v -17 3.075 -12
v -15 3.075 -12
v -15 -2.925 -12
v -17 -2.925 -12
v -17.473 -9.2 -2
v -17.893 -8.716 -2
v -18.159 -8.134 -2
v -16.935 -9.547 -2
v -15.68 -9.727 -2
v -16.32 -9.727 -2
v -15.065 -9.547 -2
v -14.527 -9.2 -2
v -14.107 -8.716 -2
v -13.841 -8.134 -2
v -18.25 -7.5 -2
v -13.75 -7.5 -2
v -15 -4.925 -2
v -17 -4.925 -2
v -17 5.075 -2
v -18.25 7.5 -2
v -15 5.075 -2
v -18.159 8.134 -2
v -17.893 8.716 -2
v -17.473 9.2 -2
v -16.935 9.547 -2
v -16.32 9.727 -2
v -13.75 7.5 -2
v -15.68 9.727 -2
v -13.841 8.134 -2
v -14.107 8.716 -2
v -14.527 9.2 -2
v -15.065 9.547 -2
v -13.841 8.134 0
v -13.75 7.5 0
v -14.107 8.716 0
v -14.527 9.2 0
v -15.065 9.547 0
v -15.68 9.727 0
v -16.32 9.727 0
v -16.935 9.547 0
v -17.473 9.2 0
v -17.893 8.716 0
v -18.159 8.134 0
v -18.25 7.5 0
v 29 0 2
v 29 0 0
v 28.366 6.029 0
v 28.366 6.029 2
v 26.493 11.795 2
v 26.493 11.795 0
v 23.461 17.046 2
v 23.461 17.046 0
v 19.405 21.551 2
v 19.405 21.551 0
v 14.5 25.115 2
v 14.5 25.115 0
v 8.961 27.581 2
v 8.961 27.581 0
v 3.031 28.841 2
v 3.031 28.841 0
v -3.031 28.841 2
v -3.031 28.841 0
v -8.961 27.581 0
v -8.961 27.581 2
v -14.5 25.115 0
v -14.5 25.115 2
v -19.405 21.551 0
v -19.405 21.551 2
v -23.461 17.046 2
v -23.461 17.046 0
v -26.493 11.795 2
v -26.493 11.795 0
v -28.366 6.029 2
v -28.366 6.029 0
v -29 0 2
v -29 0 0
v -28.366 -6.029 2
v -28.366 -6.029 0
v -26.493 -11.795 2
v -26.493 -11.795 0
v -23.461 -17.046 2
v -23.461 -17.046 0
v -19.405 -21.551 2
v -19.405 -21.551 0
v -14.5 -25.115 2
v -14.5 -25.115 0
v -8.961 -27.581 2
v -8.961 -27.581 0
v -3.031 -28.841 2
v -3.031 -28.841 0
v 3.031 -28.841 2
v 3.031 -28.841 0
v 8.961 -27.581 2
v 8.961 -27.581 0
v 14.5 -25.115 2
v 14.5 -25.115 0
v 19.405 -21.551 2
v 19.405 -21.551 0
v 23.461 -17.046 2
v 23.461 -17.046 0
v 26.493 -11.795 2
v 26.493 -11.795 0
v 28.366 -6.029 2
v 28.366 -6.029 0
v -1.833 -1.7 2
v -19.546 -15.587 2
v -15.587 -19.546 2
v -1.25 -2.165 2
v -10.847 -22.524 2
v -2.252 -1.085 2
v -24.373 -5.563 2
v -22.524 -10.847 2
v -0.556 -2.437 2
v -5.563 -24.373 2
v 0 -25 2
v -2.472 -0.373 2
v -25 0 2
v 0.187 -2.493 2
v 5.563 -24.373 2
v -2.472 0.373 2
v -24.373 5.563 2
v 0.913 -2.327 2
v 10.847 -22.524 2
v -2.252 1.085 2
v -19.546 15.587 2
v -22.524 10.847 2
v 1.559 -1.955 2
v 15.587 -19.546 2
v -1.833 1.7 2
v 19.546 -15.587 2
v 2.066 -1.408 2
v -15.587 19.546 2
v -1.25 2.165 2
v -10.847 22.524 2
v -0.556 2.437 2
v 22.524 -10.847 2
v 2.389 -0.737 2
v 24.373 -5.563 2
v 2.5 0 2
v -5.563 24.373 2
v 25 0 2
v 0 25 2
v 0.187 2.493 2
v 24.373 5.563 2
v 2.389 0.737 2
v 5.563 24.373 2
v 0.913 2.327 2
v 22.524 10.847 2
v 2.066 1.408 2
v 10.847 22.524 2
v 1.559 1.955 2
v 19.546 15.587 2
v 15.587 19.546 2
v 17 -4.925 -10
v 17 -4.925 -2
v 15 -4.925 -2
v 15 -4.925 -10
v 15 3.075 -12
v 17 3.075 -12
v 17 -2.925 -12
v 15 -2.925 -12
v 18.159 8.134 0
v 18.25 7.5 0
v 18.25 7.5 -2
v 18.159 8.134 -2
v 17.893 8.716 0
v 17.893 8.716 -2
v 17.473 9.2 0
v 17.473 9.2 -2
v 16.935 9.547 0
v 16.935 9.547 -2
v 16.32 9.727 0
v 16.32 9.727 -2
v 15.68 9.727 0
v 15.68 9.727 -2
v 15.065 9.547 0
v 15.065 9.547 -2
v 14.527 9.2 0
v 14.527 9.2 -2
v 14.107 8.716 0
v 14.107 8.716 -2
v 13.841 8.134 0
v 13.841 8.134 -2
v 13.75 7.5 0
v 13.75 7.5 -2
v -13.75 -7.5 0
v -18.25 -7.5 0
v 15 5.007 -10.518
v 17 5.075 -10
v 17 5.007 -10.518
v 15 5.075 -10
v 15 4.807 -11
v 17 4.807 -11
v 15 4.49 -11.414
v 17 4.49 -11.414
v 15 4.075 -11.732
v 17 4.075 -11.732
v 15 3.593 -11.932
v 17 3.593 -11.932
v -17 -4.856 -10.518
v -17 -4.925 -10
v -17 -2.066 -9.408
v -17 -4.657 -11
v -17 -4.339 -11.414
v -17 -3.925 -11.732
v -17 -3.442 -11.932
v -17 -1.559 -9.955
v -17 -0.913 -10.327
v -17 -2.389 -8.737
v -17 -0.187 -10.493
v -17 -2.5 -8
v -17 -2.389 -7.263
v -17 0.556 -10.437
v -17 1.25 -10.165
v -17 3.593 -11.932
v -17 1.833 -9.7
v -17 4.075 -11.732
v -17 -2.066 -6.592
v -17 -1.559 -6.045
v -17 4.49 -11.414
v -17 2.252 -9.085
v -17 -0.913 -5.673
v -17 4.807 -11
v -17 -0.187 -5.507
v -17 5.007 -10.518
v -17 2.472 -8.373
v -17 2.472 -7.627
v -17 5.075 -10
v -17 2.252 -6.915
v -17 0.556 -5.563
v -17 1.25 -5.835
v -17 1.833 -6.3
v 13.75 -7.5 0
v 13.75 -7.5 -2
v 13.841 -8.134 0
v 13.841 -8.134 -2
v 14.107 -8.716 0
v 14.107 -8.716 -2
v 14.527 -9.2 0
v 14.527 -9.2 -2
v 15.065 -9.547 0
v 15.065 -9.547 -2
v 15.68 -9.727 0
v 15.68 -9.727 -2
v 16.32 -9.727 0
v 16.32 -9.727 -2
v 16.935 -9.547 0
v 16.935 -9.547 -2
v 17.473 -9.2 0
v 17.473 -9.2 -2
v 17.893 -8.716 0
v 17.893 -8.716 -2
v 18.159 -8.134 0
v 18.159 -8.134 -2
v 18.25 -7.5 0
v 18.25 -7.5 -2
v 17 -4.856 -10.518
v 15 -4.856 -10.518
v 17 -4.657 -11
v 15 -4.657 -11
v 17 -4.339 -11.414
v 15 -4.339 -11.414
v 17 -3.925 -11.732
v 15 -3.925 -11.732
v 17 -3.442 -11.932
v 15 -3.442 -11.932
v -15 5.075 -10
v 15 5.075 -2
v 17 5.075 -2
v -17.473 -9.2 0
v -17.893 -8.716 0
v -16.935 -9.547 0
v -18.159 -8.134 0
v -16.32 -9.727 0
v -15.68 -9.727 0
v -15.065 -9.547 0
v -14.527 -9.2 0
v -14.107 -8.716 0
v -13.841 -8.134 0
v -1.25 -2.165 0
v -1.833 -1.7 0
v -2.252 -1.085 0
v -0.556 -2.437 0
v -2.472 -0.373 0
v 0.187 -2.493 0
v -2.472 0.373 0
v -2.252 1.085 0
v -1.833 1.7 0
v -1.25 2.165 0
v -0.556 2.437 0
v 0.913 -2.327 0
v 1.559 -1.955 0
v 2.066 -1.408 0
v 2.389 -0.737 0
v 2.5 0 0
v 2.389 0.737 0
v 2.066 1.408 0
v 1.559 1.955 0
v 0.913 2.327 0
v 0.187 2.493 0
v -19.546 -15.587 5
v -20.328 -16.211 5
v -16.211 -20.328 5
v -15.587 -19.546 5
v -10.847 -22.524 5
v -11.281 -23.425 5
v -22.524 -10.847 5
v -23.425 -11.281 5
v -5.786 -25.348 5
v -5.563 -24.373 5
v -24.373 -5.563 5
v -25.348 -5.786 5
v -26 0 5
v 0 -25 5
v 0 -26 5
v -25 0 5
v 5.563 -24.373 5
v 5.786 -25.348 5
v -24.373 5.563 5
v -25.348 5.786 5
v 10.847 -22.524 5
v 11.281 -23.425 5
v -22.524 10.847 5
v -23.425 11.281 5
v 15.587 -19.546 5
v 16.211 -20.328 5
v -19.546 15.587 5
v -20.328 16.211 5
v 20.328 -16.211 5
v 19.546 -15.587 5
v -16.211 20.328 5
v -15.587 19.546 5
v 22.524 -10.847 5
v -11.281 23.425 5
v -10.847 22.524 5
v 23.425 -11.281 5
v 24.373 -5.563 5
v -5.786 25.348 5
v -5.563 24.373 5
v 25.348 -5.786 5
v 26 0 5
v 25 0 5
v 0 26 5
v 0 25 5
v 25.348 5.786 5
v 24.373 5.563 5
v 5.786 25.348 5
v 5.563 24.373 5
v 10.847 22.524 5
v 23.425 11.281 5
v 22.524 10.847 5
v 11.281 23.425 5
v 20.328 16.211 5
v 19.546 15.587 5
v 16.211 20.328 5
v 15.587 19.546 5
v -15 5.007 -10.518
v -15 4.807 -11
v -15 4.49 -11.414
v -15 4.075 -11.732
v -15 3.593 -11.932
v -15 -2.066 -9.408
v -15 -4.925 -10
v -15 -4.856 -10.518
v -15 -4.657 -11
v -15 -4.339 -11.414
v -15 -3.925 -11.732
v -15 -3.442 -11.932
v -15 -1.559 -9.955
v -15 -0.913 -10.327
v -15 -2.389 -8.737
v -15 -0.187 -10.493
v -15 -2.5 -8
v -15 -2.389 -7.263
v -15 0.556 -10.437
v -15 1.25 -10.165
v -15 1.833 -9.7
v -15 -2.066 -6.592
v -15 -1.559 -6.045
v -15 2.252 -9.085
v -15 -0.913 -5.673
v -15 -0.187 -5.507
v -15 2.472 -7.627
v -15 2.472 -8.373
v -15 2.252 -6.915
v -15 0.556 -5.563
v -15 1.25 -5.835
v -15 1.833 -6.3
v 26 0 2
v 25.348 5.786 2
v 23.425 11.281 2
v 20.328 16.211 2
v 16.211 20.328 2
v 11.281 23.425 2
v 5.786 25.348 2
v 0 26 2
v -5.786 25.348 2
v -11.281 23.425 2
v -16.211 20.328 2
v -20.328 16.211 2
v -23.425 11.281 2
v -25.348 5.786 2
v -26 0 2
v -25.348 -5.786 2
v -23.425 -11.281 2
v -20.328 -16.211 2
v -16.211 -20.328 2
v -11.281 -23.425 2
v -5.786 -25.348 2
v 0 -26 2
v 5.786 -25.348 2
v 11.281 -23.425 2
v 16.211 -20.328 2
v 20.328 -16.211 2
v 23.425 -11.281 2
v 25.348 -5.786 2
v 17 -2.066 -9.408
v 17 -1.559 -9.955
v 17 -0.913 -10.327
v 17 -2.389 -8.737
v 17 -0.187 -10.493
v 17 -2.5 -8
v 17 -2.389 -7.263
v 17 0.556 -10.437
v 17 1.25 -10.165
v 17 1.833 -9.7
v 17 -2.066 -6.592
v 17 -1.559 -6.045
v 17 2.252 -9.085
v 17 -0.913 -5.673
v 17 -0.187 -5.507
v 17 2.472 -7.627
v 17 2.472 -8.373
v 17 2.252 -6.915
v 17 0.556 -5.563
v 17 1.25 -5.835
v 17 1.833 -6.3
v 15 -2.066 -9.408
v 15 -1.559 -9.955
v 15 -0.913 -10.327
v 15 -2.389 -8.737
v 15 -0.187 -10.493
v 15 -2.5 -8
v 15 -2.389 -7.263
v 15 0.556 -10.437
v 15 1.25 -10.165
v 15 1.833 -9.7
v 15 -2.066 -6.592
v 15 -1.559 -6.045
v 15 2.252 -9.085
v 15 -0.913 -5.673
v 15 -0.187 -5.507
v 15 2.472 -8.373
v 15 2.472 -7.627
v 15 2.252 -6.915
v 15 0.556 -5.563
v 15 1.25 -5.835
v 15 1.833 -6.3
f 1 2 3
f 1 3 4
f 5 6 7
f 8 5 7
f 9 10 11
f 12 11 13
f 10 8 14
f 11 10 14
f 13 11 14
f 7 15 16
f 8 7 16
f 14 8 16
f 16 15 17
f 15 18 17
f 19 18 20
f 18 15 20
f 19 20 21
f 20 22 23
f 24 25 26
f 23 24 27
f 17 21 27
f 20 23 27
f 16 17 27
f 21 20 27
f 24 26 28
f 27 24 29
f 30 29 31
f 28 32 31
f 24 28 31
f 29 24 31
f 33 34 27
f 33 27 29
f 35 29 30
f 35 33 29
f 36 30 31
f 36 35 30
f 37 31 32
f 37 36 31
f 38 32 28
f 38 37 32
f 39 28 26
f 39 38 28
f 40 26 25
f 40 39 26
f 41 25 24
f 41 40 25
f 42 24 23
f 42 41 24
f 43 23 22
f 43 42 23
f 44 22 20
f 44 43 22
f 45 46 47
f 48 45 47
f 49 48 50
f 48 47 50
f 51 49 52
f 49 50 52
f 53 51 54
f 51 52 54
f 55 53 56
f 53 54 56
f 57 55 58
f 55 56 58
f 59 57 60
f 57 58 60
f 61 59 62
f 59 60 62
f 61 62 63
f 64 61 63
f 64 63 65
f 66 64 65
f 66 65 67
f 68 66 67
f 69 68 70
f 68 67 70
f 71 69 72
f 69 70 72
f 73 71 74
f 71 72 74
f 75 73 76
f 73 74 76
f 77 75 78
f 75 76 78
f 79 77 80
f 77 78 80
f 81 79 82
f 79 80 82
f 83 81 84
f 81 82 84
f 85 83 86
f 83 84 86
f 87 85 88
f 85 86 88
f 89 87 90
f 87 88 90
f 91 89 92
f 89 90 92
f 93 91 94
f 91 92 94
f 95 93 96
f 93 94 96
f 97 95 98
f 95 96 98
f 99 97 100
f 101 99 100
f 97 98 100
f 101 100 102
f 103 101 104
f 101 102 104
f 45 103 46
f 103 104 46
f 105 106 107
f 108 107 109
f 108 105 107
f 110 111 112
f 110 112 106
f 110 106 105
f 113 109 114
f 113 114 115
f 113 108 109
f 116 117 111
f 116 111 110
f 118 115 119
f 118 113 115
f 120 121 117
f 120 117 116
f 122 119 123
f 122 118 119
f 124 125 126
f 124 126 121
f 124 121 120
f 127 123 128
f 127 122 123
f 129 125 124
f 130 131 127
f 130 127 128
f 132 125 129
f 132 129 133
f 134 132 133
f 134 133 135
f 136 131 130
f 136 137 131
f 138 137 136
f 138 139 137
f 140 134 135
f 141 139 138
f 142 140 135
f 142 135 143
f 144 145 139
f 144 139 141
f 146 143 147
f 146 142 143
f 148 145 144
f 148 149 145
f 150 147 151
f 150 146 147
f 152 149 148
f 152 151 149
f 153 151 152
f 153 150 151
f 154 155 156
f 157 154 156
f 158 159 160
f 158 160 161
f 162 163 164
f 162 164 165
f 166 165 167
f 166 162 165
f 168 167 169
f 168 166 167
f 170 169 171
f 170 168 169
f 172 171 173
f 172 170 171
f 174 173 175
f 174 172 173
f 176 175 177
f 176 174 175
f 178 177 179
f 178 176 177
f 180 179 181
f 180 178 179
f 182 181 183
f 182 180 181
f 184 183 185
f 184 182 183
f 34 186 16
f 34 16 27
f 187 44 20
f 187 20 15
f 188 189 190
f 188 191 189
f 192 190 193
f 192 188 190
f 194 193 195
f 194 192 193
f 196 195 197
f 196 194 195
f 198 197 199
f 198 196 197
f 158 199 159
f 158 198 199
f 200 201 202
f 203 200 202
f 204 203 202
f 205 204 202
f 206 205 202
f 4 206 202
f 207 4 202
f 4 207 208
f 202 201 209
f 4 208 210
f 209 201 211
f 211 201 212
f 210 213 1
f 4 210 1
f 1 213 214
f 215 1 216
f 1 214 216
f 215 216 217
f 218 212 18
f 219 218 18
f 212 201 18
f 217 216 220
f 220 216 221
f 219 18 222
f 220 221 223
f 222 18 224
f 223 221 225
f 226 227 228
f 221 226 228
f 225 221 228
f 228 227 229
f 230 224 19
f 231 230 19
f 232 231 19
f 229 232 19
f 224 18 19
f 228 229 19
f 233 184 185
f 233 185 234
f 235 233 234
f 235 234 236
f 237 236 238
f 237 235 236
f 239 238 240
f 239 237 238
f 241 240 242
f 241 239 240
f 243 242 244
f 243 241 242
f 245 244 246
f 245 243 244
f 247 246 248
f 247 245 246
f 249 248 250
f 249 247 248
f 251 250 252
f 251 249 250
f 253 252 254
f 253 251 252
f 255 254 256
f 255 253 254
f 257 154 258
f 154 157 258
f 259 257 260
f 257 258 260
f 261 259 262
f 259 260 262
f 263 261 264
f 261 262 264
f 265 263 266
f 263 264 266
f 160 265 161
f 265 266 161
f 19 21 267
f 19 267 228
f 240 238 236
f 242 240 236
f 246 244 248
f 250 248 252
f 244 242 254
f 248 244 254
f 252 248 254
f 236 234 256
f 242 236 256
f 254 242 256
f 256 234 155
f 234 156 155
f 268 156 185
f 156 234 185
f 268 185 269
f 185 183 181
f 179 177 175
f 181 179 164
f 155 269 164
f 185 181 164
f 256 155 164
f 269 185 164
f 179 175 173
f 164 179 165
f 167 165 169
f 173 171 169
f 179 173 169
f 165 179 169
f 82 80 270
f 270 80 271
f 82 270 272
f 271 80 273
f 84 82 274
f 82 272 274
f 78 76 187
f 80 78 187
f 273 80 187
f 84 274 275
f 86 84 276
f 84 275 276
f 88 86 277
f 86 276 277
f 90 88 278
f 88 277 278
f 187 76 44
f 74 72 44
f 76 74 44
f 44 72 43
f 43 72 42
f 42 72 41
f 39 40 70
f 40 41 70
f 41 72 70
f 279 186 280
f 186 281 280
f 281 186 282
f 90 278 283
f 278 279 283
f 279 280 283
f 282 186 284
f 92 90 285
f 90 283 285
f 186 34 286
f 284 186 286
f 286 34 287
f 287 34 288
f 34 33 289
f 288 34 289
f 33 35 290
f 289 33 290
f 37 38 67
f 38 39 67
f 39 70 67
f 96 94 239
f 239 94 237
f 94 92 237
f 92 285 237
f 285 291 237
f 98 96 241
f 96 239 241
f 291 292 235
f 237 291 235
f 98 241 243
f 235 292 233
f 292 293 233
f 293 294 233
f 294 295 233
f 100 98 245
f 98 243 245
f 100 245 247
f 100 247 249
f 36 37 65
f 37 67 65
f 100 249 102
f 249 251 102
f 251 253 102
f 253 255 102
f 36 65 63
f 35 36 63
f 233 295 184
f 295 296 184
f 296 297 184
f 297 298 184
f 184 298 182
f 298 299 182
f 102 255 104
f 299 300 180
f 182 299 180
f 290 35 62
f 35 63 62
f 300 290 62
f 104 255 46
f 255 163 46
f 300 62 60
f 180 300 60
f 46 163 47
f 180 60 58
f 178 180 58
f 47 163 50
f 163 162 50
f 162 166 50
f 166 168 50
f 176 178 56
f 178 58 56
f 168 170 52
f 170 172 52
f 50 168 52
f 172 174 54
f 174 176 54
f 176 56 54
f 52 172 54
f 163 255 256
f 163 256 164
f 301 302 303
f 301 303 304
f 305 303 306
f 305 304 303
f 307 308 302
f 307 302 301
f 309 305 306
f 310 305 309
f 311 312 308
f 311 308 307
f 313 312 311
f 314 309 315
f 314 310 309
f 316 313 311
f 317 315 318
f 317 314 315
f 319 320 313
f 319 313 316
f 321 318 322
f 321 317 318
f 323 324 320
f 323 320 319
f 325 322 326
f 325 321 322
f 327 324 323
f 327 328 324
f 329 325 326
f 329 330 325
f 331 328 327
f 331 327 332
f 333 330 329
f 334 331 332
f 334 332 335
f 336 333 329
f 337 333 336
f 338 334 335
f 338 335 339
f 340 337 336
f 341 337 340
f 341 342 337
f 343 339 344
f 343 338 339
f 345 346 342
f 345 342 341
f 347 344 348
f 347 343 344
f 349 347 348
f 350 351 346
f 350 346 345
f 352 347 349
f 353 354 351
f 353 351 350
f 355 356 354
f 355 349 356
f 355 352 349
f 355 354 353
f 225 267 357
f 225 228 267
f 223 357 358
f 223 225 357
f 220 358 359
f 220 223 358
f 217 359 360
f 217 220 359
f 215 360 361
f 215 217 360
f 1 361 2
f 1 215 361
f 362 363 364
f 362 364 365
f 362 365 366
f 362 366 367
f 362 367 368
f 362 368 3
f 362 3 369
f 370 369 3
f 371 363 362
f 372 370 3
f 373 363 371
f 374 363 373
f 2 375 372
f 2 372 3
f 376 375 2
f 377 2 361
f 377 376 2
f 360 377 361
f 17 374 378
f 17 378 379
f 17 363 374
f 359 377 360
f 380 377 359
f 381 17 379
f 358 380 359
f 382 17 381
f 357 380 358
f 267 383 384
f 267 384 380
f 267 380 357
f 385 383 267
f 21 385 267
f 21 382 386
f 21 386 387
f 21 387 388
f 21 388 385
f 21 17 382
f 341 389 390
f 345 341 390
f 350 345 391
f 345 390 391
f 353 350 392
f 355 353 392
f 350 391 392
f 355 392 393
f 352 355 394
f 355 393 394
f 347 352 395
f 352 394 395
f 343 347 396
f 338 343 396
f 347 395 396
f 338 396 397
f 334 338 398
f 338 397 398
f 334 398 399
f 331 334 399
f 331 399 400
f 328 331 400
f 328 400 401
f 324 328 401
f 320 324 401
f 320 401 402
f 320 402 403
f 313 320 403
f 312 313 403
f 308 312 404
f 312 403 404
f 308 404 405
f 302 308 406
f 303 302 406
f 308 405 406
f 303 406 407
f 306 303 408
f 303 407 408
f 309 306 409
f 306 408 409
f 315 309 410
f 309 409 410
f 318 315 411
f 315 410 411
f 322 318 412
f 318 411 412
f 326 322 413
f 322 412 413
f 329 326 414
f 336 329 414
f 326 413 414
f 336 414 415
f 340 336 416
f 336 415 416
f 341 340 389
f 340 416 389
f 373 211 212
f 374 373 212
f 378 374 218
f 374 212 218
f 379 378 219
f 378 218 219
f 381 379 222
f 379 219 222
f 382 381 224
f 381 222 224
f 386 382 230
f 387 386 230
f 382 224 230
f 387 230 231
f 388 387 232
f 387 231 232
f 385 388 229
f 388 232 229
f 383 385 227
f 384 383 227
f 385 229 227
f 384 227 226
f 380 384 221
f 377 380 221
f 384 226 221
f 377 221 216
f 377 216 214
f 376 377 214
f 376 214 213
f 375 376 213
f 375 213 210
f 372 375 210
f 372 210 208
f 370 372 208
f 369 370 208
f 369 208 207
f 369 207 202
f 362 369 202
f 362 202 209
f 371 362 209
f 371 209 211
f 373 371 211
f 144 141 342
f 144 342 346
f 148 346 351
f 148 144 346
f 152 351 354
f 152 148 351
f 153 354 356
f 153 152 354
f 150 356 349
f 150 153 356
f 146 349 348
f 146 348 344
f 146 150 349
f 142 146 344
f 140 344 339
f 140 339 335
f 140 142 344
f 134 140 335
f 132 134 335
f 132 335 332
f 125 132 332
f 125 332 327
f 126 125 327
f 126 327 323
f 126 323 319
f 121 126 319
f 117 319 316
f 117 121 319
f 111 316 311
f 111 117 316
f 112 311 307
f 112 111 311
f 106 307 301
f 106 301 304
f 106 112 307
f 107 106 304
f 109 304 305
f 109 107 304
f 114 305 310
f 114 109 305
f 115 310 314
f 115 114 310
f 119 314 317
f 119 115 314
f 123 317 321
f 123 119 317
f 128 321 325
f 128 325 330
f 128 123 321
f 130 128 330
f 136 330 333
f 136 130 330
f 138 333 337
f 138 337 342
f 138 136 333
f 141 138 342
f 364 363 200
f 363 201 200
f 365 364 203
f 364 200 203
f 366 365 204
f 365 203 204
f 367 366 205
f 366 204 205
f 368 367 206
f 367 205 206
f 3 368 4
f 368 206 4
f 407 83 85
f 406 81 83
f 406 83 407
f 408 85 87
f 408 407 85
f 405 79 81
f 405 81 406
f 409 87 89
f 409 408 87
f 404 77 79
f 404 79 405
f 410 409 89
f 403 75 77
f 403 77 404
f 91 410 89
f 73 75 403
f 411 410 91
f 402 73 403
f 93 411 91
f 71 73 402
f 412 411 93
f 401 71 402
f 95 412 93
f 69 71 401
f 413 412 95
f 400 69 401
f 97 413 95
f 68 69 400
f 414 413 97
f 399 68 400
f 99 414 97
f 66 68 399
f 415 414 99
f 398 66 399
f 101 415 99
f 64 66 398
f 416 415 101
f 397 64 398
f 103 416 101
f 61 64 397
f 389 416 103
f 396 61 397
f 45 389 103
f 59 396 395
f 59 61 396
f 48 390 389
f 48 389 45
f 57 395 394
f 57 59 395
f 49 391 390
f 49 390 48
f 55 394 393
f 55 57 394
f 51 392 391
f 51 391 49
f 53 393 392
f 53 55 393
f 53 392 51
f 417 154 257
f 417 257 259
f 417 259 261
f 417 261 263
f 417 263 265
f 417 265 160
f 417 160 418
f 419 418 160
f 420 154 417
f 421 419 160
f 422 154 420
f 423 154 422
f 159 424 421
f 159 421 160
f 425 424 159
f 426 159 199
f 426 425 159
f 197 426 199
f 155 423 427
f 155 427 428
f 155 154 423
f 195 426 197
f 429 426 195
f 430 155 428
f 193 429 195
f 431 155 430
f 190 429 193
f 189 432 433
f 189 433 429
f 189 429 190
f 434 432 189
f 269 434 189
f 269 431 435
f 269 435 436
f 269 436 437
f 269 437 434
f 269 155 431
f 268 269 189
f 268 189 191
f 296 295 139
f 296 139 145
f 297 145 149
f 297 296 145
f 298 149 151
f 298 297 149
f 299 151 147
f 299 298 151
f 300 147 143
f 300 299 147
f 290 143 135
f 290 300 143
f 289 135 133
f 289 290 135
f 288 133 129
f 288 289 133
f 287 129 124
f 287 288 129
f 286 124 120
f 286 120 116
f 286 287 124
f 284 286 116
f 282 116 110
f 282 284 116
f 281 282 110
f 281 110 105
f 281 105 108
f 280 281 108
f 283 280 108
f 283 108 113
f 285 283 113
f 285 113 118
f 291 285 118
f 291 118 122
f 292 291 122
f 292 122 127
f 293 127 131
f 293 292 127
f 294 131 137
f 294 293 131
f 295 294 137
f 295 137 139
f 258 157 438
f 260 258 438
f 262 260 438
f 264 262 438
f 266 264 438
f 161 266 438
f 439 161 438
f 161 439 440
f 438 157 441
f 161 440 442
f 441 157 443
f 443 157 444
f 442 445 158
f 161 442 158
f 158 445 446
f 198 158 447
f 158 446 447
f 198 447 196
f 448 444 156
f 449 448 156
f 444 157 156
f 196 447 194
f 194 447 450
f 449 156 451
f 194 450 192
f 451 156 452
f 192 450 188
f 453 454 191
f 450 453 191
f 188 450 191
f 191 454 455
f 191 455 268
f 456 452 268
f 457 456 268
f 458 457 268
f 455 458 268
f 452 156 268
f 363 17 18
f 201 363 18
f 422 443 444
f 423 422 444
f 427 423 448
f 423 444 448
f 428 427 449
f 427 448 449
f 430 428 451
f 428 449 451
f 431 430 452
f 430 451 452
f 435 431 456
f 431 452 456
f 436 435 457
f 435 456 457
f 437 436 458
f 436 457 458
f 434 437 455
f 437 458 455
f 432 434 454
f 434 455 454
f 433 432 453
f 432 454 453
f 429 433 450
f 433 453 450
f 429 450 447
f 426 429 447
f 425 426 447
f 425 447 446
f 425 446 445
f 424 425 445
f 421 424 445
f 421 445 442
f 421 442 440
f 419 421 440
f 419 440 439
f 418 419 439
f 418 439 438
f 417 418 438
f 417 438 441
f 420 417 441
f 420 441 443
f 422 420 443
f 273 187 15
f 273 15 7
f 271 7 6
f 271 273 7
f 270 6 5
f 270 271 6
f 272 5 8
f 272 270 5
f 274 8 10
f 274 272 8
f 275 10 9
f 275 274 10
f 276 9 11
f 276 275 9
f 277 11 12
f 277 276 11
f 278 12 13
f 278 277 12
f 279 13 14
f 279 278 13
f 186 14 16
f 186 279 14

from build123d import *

# Parameters (mm, degrees)
SKETCH1_R           = 29
SKETCH1_R_2         = 2.5
BOSS_EXTRUDE1_DEPTH = 2
SKETCH2_R           = 26
SKETCH2_R_2         = 25
BOSS_EXTRUDE2_DEPTH = 3
BOSS_EXTRUDE3_DEPTH = 2
SKETCH4_W           = 2
SKETCH4_H           = 10
BOSS_EXTRUDE4_DEPTH = 10
FILLET1_R           = 2
SKETCH5_R           = 2.5
CUT_EXTRUDE1_DEPTH  = 56.686623169


with BuildPart() as part:
    # Sketch1 → Boss-Extrude1 (new body)
    with BuildSketch(Plane.XY):
        Circle(SKETCH1_R)
        Circle(SKETCH1_R_2, mode=Mode.SUBTRACT)
    extrude(amount=BOSS_EXTRUDE1_DEPTH)

    # Sketch2 → Boss-Extrude2 (add)
    with BuildSketch(Plane.XY.offset(2)):
        Circle(SKETCH2_R)
        Circle(SKETCH2_R_2, mode=Mode.SUBTRACT)
    extrude(amount=BOSS_EXTRUDE2_DEPTH)

    # Sketch3 → Boss-Extrude3 (add)
    with BuildSketch(Plane(origin=(0, 0, 0), x_dir=(-1, 0, 0), z_dir=(0, 0, -1))):
        with BuildLine():
            Line((-13.75, 7.5), (-13.75, -7.5))
            ThreePointArc((-13.75, -7.5), (-16, -9.75), (-18.25, -7.5))
            Line((-18.25, -7.5), (-18.25, 7.5))
            ThreePointArc((-18.25, 7.5), (-16, 9.75), (-13.75, 7.5))
        make_face()
        with BuildLine():
            Line((18.25, 7.5), (18.25, -7.5))
            ThreePointArc((18.25, -7.5), (16, -9.75), (13.75, -7.5))
            Line((13.75, -7.5), (13.75, 7.5))
            ThreePointArc((13.75, 7.5), (16, 9.75), (18.25, 7.5))
        make_face()
    extrude(amount=BOSS_EXTRUDE3_DEPTH)

    # Sketch4 → Boss-Extrude4 (add)
    with BuildSketch(Plane(origin=(0, 0, -2), x_dir=(-1, 0, 0), z_dir=(0, 0, -1))):
        with Locations((-16, 0.07539605)):
            Rectangle(SKETCH4_W, SKETCH4_H)
        with Locations((16, 0.07539605)):
            Rectangle(SKETCH4_W, SKETCH4_H)
    extrude(amount=BOSS_EXTRUDE4_DEPTH)

    # Fillet1
    fillet1_edges = [part.edges().sort_by_distance(p)[0] for p in [
        (16, 5.07539605, -12),
        (16, -4.92460395, -12),
        (-16, 5.07539605, -12),
        (-16, -4.92460395, -12),
    ]]
    fillet(fillet1_edges, radius=FILLET1_R)

    # Sketch5 → Cut-Extrude1 (cut, through all)
    with BuildSketch(Plane.ZY.offset(17)):
        with Locations(Location((-8, 0, 0), (0, 0, 270))):
            Circle(SKETCH5_R)
    extrude(amount=-CUT_EXTRUDE1_DEPTH, mode=Mode.SUBTRACT)


solid = part.part
